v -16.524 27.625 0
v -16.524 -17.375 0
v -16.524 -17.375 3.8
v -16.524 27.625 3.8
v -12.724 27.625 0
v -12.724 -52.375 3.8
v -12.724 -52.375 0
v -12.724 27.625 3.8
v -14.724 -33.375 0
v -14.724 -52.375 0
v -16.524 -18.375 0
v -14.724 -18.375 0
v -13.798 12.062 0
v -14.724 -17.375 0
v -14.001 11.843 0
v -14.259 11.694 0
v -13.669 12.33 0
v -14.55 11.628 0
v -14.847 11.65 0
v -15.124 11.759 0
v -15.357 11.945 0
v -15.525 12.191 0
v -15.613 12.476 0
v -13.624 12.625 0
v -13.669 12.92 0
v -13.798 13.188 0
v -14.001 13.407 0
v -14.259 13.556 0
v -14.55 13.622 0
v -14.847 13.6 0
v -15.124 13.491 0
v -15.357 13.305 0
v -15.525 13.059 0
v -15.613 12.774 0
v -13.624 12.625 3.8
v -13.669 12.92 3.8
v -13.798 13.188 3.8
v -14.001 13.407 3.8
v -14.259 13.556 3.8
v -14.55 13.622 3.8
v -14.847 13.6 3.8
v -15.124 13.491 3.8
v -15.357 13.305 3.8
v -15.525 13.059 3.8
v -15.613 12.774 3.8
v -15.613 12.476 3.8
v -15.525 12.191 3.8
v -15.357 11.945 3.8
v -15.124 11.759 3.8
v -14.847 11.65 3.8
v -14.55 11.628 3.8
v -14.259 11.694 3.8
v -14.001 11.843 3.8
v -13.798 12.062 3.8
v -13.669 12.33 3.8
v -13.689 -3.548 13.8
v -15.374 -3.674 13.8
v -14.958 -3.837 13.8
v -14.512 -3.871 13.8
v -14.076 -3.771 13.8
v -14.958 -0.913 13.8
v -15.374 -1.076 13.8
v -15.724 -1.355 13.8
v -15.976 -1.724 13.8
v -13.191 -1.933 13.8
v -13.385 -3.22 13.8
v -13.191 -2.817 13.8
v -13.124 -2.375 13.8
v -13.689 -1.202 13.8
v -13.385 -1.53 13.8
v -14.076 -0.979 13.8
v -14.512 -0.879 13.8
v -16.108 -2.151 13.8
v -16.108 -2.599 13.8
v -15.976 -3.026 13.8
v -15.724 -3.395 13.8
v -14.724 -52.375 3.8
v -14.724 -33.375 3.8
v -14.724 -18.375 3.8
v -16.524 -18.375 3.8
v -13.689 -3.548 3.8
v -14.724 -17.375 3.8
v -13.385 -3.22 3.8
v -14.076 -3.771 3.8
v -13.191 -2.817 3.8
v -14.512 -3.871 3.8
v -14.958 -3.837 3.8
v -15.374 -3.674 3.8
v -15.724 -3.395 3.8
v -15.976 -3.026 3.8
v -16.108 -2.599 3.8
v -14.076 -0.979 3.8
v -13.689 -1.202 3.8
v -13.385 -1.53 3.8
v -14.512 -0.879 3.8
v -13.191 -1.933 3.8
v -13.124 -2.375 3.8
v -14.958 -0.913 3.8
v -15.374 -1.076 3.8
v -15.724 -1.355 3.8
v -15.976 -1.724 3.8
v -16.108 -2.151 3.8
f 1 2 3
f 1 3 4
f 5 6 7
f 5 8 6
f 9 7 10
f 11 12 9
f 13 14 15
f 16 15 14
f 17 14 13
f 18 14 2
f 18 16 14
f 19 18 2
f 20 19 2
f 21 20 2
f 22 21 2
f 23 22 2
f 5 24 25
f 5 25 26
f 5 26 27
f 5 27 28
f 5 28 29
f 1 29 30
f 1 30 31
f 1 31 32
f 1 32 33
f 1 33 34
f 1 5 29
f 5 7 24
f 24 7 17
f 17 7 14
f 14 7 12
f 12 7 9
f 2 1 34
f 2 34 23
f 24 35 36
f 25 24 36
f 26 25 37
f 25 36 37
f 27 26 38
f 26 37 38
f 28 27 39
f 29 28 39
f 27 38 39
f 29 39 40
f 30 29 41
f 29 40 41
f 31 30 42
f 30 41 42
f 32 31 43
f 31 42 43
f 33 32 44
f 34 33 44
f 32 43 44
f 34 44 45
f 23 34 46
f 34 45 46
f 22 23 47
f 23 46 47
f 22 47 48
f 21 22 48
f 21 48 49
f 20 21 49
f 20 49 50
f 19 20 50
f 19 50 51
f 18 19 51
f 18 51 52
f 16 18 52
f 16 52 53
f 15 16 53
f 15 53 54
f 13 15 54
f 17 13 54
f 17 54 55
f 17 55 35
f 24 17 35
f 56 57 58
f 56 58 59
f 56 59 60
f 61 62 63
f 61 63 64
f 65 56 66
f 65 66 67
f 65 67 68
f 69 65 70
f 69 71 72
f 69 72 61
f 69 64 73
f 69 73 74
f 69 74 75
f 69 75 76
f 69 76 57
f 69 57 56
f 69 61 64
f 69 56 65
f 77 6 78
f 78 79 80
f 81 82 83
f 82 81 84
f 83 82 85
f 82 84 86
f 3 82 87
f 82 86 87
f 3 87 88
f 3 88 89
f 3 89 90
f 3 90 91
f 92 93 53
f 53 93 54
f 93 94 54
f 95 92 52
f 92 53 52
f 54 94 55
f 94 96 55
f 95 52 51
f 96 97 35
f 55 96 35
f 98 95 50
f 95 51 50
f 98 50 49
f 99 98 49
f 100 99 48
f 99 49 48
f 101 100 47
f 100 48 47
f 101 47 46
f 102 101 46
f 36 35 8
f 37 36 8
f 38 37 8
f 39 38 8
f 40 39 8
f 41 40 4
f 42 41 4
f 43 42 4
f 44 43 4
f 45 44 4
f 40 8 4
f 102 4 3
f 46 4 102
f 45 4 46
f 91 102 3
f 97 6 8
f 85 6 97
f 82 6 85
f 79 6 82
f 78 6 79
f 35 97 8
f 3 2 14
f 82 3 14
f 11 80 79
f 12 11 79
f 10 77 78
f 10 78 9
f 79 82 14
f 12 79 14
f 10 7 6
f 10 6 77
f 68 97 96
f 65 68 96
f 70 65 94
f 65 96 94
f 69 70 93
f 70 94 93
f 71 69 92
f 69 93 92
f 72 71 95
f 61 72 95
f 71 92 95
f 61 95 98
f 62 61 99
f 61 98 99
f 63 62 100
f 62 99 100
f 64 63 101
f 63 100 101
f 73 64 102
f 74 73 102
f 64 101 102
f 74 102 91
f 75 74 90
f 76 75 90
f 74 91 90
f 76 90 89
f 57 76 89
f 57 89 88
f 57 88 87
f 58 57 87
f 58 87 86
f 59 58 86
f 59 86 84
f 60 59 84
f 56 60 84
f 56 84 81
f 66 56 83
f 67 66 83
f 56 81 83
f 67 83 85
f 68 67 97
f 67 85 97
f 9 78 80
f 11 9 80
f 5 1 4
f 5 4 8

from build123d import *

# Parameters (mm, degrees)
ESBO_O1_W                = 3.8
ESBO_O1_H                = 45
RESSALTO_EXTRUS_O1_DEPTH = 3.8
ESBO_O2_R                = 1.5
RESSALTO_EXTRUS_O2_DEPTH = 10
ESBO_O3_W                = 2
ESBO_O3_H                = 3.8
RESSALTO_EXTRUS_O3_DEPTH = 1
ESBO_O5_R                = 1
CORTE_EXTRUS_O1_DEPTH    = 4
RESSALTO_EXTRUS_O7_DEPTH = 3.8
ESBO_O10_W               = 2
ESBO_O10_H               = 3.8
RESSALTO_EXTRUS_O8_DEPTH = 19


with BuildPart() as part:
    # Esboço1 → Ressalto-extrusão1 (new body)
    with BuildSketch(Plane.XY):
        with Locations((-14.624350205, 5.125)):
            Rectangle(ESBO_O1_W, ESBO_O1_H)
    extrude(amount=RESSALTO_EXTRUS_O1_DEPTH)

    # Esboço2 → Ressalto-extrusão2 (add)
    with BuildSketch(Plane.XY.offset(3.8)):
        with Locations((-14.624350205, -2.375)):
            Circle(ESBO_O2_R)
    extrude(amount=RESSALTO_EXTRUS_O2_DEPTH)

    # Esboço3 → Ressalto-extrusão3 (add)
    with BuildSketch(Plane(origin=(0, -17.375, 0), x_dir=(-1, 0, 0), z_dir=(0, -1, 0))):
        with Locations((13.724350205, -1.9)):
            Rectangle(ESBO_O3_W, ESBO_O3_H)
    extrude(amount=RESSALTO_EXTRUS_O3_DEPTH)

    # Esboço5 → Corte-extrusão1 (cut)
    with BuildSketch(Plane.XY.offset(3.8)):
        with Locations((-14.624350205, 12.625)):
            Circle(ESBO_O5_R)
    extrude(amount=-CORTE_EXTRUS_O1_DEPTH, mode=Mode.SUBTRACT)

    # Esboço9 → Ressalto-extrusão7 (add)
    with BuildSketch(Plane.XY.offset(3.8)):
        Polygon((-12.724350205, -18.375), (-12.724350205, -33.375), (-14.724350205, -33.375), (-16.524350205, -18.375), align=None)
    extrude(amount=-RESSALTO_EXTRUS_O7_DEPTH)

    # Esboço10 → Ressalto-extrusão8 (add)
    with BuildSketch(Plane(origin=(0, -33.375, 0), x_dir=(-1, 0, 0), z_dir=(0, -1, 0))):
        with Locations((13.724350205, -1.9)):
            Rectangle(ESBO_O10_W, ESBO_O10_H)
    extrude(amount=RESSALTO_EXTRUS_O8_DEPTH)


solid = part.part
